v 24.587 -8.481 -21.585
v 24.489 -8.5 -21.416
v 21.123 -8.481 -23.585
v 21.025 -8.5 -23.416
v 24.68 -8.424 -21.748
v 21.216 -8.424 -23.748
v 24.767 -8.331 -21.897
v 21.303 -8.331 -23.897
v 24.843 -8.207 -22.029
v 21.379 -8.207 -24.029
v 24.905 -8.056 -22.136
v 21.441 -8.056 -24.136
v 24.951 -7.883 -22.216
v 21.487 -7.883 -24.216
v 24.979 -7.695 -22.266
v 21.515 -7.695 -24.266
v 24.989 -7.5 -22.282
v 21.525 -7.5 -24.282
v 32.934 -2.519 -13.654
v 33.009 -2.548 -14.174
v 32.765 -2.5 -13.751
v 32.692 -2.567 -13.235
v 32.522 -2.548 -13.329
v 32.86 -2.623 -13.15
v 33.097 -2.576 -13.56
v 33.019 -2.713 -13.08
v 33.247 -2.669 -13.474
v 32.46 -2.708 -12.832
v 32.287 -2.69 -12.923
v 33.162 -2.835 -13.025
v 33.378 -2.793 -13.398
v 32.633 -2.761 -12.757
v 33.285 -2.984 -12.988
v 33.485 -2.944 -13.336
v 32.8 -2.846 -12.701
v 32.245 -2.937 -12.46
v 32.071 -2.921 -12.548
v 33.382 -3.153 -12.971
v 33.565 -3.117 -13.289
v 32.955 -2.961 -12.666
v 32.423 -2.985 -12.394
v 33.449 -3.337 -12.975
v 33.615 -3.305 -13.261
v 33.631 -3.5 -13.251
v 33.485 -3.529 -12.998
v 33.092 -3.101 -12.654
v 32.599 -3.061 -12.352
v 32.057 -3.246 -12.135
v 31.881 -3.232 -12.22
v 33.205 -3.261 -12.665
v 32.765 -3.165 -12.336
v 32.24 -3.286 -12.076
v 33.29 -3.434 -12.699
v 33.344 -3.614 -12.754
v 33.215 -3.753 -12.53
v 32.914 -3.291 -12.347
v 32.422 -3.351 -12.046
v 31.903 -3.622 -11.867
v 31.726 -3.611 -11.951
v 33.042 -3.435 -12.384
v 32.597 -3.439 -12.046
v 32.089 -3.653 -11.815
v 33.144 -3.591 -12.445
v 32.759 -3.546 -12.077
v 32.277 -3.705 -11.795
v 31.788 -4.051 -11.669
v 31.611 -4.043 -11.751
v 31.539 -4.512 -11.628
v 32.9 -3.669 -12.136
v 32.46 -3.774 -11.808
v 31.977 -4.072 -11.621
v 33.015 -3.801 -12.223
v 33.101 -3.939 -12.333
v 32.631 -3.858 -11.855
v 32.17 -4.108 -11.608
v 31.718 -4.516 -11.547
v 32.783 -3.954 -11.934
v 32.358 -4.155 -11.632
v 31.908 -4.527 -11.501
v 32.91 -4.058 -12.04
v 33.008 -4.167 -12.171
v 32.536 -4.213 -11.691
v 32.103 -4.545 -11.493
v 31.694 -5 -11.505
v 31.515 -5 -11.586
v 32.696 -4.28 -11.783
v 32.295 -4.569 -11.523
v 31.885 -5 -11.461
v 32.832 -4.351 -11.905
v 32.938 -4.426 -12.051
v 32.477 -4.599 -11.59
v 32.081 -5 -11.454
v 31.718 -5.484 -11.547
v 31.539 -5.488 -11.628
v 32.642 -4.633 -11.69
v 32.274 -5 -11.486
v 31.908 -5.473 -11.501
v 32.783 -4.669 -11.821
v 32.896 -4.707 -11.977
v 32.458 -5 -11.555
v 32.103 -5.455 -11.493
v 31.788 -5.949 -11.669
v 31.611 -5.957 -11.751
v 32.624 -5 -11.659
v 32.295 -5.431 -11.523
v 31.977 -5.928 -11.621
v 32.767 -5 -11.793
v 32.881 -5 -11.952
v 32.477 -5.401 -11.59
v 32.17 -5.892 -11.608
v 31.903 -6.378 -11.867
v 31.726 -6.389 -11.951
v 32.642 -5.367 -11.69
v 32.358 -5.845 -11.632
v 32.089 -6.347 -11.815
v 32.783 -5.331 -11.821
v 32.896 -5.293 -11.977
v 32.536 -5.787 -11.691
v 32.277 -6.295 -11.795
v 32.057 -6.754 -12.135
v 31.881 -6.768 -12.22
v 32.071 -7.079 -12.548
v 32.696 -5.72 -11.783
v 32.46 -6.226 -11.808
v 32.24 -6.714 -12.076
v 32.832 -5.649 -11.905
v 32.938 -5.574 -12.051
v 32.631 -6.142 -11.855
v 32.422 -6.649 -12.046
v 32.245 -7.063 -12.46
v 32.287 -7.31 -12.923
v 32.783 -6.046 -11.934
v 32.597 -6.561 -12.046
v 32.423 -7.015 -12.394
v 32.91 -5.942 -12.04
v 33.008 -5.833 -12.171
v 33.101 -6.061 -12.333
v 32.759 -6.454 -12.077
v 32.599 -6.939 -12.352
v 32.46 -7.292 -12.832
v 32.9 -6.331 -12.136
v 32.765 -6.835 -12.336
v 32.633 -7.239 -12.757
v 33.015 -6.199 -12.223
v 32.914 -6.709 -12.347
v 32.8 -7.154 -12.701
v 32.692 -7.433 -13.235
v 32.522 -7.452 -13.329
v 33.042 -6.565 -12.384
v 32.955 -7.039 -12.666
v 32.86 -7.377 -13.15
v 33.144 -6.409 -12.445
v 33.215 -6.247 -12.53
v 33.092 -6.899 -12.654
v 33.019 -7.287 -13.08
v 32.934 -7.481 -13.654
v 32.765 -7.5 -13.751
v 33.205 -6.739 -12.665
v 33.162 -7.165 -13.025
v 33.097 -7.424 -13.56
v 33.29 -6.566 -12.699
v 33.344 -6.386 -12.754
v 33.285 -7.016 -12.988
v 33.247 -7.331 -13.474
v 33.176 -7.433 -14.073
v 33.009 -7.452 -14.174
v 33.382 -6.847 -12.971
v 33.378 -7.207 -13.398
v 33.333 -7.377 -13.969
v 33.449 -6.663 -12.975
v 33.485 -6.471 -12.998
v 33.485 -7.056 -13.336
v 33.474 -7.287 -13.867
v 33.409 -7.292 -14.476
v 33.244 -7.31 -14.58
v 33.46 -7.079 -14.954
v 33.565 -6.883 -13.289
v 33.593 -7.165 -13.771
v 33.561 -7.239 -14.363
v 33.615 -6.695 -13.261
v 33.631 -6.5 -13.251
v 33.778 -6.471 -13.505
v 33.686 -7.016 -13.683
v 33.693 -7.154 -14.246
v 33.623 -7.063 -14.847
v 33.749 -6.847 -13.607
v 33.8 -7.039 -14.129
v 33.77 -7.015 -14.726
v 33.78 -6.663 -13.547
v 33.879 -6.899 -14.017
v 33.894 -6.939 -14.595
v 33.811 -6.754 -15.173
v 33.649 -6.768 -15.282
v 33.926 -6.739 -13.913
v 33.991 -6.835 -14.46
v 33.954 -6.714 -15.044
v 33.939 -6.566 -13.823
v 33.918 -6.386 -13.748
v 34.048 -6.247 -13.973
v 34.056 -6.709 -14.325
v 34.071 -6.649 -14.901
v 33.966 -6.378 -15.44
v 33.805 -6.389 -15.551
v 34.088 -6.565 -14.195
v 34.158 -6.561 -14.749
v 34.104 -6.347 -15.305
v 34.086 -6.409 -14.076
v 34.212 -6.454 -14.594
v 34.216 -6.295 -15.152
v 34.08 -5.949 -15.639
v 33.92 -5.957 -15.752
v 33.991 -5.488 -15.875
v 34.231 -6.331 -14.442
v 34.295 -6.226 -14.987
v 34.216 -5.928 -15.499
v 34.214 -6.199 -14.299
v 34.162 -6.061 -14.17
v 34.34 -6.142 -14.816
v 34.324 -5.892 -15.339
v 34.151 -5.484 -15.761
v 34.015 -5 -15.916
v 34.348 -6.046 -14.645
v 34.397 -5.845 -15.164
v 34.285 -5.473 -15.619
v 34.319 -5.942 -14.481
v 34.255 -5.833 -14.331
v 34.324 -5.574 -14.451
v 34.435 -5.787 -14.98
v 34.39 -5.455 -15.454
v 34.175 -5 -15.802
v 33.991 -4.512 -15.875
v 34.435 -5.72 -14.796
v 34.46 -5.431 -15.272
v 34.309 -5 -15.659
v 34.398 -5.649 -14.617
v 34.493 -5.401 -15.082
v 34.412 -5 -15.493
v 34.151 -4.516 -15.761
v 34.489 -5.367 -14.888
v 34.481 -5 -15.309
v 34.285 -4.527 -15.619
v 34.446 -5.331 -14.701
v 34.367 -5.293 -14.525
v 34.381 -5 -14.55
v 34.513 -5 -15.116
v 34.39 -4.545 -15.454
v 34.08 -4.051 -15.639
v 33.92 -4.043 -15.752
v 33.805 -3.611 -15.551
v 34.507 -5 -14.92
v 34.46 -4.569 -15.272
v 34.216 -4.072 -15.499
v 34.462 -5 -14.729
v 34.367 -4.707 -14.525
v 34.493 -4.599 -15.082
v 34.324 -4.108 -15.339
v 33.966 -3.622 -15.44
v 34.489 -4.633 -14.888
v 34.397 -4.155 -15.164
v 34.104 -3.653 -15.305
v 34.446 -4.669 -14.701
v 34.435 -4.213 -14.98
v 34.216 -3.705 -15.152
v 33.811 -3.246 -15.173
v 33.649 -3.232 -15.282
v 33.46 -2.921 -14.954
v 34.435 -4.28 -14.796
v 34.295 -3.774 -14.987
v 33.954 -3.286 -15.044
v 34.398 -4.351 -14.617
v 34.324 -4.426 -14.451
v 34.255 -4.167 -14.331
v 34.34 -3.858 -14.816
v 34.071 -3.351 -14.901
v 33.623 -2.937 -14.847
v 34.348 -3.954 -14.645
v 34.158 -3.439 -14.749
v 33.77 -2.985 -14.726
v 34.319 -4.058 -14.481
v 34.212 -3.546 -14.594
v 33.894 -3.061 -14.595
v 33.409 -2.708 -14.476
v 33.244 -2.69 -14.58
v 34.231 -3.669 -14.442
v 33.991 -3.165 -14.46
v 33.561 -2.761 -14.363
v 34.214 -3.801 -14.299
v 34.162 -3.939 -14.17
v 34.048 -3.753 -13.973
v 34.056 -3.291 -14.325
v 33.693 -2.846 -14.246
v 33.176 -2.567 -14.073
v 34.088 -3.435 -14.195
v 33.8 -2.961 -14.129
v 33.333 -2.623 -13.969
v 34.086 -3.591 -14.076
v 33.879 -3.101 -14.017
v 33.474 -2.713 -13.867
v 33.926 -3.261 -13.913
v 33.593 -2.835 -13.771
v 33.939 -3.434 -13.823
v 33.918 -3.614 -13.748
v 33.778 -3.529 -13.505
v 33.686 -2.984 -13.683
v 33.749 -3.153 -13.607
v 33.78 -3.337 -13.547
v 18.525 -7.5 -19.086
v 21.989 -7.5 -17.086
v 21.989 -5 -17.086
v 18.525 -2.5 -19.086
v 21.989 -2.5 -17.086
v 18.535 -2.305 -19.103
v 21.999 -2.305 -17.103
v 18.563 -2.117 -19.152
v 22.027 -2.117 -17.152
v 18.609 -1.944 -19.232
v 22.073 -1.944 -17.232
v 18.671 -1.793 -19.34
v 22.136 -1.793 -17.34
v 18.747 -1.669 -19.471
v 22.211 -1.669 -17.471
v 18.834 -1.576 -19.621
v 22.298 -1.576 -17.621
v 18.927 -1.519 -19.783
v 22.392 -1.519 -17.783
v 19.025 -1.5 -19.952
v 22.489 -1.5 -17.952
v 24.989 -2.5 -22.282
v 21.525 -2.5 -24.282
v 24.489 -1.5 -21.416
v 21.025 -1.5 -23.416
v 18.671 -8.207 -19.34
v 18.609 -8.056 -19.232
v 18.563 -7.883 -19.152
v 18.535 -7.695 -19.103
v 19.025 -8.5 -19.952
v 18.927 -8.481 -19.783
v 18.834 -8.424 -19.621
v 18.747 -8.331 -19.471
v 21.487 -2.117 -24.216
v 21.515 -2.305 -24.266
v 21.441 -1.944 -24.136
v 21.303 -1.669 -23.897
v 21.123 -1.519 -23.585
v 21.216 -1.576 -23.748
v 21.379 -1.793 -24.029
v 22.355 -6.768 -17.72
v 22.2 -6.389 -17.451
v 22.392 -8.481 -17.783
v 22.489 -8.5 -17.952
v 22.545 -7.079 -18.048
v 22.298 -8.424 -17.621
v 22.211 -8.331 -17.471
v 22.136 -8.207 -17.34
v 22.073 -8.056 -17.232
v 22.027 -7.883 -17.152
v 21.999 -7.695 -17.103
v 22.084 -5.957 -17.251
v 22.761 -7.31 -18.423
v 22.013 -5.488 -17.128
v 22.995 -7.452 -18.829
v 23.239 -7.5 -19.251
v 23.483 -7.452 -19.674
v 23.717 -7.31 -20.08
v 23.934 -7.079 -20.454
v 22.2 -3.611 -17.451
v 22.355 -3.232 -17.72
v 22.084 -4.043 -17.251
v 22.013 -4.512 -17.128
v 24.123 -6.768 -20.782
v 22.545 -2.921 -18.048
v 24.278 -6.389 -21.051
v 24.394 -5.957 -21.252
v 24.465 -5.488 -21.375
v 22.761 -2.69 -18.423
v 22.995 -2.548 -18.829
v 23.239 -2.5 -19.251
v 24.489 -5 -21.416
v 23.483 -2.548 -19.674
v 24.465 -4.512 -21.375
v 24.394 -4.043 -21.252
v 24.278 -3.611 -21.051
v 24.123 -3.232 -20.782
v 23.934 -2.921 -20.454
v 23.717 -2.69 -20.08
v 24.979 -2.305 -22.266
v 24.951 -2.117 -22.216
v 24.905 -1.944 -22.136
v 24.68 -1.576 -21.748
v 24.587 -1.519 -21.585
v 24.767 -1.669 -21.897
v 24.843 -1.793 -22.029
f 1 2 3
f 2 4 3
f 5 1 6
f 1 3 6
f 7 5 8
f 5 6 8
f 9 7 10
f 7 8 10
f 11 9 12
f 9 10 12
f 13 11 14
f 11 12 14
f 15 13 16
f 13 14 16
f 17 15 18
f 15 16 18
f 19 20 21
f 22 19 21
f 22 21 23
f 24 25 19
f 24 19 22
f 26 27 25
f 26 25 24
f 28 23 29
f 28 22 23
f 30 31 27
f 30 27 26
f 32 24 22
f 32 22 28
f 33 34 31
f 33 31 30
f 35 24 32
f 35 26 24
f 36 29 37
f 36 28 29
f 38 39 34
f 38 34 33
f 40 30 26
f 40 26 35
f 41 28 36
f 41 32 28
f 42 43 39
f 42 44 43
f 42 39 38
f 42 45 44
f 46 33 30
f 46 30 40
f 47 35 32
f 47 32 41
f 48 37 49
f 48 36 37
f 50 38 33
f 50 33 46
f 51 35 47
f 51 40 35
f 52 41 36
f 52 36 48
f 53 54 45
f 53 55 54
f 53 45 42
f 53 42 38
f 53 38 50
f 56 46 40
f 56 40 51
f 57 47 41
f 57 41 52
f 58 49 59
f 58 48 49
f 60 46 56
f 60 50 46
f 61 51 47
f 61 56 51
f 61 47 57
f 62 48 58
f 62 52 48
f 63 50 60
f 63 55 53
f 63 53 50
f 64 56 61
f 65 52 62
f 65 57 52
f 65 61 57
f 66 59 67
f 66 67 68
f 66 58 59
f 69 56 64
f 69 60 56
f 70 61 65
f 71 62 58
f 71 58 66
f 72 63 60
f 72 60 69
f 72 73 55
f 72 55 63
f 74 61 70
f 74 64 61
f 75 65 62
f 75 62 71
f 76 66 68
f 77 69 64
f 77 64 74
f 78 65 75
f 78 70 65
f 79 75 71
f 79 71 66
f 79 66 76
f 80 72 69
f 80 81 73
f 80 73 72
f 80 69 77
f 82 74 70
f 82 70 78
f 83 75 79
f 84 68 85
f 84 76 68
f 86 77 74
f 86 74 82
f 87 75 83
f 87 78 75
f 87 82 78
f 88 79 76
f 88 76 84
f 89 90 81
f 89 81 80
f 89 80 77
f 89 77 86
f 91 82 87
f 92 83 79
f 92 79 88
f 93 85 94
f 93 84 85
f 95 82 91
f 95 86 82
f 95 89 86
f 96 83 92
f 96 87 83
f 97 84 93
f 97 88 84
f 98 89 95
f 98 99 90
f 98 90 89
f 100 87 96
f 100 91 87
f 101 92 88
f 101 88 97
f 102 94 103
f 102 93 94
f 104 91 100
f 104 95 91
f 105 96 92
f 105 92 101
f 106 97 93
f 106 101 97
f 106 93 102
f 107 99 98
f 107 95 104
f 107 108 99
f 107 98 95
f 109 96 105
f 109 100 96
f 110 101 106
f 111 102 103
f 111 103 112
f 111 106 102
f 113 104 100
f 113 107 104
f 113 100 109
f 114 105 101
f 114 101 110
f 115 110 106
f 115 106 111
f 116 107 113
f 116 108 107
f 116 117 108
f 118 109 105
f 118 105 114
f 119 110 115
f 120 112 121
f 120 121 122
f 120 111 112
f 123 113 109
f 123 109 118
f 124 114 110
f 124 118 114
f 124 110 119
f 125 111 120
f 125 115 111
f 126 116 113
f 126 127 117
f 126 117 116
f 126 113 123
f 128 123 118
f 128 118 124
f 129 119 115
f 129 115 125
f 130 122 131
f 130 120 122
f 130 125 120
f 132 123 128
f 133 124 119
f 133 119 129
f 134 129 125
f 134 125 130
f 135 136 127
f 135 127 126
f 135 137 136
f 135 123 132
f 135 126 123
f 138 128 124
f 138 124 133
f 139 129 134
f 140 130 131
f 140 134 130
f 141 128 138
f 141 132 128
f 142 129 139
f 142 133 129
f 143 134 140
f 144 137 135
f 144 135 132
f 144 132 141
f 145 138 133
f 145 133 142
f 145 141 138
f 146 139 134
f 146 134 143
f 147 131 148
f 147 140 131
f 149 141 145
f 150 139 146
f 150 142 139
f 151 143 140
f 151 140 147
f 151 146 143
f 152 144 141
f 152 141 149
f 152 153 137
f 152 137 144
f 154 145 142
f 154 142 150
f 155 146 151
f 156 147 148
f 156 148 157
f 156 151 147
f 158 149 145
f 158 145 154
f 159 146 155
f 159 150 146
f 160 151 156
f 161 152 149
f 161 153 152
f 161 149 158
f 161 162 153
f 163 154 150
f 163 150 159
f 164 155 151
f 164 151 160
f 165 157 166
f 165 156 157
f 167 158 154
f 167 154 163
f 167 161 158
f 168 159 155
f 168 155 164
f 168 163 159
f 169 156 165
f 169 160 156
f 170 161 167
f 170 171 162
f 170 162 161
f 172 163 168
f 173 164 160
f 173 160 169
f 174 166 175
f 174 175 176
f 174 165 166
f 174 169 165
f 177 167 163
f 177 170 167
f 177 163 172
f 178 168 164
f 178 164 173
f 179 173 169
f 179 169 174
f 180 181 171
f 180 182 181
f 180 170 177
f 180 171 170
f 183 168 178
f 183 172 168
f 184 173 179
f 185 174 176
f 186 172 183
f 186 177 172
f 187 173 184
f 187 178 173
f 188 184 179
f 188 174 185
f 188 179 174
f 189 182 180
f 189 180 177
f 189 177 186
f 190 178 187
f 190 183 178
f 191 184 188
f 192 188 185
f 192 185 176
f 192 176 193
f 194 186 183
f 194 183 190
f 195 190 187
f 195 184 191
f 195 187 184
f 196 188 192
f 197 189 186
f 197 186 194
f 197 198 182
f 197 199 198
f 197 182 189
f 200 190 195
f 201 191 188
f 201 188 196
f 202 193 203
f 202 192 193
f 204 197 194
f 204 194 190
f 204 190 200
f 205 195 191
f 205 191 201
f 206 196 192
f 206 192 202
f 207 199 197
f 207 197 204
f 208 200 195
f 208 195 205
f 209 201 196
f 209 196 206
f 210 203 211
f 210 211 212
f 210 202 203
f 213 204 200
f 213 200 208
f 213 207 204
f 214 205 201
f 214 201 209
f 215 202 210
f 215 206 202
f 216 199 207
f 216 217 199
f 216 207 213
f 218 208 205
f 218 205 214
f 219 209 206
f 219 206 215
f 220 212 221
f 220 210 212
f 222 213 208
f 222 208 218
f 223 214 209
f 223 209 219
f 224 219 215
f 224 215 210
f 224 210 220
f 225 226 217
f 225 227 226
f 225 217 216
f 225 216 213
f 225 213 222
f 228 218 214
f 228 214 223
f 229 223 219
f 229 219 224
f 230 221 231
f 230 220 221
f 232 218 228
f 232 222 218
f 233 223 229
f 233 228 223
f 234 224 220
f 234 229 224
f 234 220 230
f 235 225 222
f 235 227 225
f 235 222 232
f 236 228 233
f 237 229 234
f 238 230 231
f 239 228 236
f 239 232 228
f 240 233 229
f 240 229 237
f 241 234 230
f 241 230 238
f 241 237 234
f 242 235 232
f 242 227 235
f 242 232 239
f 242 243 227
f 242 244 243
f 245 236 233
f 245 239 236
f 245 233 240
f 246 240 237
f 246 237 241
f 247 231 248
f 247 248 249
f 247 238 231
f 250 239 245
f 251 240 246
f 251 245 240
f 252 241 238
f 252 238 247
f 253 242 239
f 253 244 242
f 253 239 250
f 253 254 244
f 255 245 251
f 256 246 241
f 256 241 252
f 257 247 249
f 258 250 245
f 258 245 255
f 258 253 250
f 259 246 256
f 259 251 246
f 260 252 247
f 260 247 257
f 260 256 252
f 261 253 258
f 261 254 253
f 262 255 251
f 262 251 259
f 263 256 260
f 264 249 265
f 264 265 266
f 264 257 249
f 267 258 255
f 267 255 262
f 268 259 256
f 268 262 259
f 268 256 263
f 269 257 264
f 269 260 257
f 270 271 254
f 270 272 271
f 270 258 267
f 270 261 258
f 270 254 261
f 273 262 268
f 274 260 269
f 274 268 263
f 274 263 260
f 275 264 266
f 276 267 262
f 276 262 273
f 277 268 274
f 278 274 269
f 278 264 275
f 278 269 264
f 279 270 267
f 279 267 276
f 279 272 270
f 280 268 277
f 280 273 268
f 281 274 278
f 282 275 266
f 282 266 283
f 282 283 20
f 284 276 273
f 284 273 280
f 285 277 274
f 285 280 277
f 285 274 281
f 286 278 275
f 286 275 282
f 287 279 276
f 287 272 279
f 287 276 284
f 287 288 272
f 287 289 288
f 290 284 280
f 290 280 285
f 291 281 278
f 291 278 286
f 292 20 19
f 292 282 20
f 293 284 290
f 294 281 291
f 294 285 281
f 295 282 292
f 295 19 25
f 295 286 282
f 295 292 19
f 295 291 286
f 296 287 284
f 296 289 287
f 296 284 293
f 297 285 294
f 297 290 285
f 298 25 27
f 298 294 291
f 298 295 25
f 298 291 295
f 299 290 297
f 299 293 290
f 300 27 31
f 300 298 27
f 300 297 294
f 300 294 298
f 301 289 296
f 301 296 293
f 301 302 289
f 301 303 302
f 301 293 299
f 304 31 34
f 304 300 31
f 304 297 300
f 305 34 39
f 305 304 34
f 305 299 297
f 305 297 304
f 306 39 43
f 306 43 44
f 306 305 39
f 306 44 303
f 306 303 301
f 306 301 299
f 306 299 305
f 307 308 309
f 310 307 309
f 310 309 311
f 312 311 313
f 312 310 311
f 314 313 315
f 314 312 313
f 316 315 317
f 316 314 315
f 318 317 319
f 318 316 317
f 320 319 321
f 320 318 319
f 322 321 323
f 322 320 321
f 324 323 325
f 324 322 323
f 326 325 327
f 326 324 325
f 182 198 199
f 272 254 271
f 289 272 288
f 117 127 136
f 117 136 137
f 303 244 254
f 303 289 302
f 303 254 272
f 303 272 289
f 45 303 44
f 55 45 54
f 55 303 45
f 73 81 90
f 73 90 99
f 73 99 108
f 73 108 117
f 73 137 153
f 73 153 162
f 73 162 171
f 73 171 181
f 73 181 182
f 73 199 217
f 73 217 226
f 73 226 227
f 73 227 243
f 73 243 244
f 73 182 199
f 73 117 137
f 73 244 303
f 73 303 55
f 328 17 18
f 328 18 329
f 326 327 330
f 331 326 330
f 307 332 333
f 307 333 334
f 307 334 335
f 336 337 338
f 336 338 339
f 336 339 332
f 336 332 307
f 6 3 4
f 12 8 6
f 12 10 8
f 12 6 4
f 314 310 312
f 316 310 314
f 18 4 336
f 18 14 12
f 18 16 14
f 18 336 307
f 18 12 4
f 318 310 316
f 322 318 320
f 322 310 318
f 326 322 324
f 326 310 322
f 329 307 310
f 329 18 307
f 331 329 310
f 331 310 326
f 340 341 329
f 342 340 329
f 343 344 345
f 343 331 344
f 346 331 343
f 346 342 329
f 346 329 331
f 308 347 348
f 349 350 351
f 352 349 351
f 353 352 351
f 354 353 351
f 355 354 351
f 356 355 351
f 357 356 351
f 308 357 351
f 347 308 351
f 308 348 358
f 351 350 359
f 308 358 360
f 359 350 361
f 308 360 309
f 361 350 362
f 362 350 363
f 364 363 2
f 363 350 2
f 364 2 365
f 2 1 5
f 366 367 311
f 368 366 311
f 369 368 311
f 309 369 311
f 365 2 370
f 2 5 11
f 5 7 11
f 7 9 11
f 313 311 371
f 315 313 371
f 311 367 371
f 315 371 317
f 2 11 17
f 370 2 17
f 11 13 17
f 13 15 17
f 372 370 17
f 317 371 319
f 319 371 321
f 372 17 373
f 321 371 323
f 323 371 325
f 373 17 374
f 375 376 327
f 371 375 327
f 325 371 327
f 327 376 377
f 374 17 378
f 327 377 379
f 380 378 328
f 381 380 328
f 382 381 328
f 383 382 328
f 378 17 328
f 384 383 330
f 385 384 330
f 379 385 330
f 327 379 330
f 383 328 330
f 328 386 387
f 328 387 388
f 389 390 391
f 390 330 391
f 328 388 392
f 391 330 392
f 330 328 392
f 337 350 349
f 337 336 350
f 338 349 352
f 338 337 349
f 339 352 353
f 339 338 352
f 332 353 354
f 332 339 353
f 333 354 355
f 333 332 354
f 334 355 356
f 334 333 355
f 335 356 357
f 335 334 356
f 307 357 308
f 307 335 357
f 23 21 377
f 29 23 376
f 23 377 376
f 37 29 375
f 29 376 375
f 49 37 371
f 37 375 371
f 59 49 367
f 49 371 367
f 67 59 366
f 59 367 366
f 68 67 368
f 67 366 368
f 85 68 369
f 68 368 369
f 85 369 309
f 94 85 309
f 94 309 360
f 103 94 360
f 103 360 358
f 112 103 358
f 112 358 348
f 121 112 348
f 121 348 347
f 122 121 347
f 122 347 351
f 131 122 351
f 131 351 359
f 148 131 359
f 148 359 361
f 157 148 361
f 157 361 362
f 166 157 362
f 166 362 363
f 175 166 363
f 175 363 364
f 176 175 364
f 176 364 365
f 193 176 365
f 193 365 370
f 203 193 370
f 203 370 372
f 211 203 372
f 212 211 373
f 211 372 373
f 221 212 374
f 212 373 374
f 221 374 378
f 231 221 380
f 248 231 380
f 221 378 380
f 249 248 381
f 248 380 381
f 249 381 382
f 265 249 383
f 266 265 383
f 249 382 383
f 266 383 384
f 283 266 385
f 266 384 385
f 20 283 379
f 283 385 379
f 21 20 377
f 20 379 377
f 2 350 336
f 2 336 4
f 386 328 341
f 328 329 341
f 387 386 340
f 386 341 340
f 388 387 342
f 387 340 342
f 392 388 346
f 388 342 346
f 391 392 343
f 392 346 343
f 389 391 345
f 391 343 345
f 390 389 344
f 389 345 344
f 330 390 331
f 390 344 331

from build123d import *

# Parameters (mm, degrees)
SKETCH023_R             = 2.5
PAD006_DEPTH            = 12
SKETCH024_W             = 7
SKETCH024_H             = 6
PAD007_DEPTH            = 4
FILLET005_R             = 1
FILLET006_R             = 1
BODY004_PLACEMENT_ANGLE = 330


with BuildPart() as part:
    # Sketch023 → Pad006 (new body)
    with BuildSketch(Plane.YZ):
        Circle(SKETCH023_R)
    extrude(amount=PAD006_DEPTH)

    # Sketch024 (on Face2 of Pad006) → Pad007 (join)
    with BuildSketch(Plane(origin=(0, 0, 0), x_dir=(0, 1, 0), z_dir=(-1, 0, 0))):
        with Locations((0, 0.5)):
            Rectangle(SKETCH024_W, SKETCH024_H)
    extrude(amount=PAD007_DEPTH)

    # Fillet005
    fillet005_edges = [part.edges().sort_by_distance(p)[0] for p in [
        (-2, 3.5, 2.5),
        (-2, 3.5, -3.5),
        (-2, -3.5, -3.5),
        (-2, -3.5, 2.5),
    ]]
    fillet(fillet005_edges, radius=FILLET005_R)

    # Fillet006
    fillet006_edges = [part.edges().sort_by_distance(p)[0] for p in [
        (12, -2.5, 0),
    ]]
    fillet(fillet006_edges, radius=FILLET006_R)


with BuildPart() as part_1:
    # Body004 placement: moved
    add(part.part.moved(Location((23.239092, -5, -19.251289))).rotate(Axis((23.239092, -5, -19.251289), (0, 1, 0)), BODY004_PLACEMENT_ANGLE))


solid = part_1.part
